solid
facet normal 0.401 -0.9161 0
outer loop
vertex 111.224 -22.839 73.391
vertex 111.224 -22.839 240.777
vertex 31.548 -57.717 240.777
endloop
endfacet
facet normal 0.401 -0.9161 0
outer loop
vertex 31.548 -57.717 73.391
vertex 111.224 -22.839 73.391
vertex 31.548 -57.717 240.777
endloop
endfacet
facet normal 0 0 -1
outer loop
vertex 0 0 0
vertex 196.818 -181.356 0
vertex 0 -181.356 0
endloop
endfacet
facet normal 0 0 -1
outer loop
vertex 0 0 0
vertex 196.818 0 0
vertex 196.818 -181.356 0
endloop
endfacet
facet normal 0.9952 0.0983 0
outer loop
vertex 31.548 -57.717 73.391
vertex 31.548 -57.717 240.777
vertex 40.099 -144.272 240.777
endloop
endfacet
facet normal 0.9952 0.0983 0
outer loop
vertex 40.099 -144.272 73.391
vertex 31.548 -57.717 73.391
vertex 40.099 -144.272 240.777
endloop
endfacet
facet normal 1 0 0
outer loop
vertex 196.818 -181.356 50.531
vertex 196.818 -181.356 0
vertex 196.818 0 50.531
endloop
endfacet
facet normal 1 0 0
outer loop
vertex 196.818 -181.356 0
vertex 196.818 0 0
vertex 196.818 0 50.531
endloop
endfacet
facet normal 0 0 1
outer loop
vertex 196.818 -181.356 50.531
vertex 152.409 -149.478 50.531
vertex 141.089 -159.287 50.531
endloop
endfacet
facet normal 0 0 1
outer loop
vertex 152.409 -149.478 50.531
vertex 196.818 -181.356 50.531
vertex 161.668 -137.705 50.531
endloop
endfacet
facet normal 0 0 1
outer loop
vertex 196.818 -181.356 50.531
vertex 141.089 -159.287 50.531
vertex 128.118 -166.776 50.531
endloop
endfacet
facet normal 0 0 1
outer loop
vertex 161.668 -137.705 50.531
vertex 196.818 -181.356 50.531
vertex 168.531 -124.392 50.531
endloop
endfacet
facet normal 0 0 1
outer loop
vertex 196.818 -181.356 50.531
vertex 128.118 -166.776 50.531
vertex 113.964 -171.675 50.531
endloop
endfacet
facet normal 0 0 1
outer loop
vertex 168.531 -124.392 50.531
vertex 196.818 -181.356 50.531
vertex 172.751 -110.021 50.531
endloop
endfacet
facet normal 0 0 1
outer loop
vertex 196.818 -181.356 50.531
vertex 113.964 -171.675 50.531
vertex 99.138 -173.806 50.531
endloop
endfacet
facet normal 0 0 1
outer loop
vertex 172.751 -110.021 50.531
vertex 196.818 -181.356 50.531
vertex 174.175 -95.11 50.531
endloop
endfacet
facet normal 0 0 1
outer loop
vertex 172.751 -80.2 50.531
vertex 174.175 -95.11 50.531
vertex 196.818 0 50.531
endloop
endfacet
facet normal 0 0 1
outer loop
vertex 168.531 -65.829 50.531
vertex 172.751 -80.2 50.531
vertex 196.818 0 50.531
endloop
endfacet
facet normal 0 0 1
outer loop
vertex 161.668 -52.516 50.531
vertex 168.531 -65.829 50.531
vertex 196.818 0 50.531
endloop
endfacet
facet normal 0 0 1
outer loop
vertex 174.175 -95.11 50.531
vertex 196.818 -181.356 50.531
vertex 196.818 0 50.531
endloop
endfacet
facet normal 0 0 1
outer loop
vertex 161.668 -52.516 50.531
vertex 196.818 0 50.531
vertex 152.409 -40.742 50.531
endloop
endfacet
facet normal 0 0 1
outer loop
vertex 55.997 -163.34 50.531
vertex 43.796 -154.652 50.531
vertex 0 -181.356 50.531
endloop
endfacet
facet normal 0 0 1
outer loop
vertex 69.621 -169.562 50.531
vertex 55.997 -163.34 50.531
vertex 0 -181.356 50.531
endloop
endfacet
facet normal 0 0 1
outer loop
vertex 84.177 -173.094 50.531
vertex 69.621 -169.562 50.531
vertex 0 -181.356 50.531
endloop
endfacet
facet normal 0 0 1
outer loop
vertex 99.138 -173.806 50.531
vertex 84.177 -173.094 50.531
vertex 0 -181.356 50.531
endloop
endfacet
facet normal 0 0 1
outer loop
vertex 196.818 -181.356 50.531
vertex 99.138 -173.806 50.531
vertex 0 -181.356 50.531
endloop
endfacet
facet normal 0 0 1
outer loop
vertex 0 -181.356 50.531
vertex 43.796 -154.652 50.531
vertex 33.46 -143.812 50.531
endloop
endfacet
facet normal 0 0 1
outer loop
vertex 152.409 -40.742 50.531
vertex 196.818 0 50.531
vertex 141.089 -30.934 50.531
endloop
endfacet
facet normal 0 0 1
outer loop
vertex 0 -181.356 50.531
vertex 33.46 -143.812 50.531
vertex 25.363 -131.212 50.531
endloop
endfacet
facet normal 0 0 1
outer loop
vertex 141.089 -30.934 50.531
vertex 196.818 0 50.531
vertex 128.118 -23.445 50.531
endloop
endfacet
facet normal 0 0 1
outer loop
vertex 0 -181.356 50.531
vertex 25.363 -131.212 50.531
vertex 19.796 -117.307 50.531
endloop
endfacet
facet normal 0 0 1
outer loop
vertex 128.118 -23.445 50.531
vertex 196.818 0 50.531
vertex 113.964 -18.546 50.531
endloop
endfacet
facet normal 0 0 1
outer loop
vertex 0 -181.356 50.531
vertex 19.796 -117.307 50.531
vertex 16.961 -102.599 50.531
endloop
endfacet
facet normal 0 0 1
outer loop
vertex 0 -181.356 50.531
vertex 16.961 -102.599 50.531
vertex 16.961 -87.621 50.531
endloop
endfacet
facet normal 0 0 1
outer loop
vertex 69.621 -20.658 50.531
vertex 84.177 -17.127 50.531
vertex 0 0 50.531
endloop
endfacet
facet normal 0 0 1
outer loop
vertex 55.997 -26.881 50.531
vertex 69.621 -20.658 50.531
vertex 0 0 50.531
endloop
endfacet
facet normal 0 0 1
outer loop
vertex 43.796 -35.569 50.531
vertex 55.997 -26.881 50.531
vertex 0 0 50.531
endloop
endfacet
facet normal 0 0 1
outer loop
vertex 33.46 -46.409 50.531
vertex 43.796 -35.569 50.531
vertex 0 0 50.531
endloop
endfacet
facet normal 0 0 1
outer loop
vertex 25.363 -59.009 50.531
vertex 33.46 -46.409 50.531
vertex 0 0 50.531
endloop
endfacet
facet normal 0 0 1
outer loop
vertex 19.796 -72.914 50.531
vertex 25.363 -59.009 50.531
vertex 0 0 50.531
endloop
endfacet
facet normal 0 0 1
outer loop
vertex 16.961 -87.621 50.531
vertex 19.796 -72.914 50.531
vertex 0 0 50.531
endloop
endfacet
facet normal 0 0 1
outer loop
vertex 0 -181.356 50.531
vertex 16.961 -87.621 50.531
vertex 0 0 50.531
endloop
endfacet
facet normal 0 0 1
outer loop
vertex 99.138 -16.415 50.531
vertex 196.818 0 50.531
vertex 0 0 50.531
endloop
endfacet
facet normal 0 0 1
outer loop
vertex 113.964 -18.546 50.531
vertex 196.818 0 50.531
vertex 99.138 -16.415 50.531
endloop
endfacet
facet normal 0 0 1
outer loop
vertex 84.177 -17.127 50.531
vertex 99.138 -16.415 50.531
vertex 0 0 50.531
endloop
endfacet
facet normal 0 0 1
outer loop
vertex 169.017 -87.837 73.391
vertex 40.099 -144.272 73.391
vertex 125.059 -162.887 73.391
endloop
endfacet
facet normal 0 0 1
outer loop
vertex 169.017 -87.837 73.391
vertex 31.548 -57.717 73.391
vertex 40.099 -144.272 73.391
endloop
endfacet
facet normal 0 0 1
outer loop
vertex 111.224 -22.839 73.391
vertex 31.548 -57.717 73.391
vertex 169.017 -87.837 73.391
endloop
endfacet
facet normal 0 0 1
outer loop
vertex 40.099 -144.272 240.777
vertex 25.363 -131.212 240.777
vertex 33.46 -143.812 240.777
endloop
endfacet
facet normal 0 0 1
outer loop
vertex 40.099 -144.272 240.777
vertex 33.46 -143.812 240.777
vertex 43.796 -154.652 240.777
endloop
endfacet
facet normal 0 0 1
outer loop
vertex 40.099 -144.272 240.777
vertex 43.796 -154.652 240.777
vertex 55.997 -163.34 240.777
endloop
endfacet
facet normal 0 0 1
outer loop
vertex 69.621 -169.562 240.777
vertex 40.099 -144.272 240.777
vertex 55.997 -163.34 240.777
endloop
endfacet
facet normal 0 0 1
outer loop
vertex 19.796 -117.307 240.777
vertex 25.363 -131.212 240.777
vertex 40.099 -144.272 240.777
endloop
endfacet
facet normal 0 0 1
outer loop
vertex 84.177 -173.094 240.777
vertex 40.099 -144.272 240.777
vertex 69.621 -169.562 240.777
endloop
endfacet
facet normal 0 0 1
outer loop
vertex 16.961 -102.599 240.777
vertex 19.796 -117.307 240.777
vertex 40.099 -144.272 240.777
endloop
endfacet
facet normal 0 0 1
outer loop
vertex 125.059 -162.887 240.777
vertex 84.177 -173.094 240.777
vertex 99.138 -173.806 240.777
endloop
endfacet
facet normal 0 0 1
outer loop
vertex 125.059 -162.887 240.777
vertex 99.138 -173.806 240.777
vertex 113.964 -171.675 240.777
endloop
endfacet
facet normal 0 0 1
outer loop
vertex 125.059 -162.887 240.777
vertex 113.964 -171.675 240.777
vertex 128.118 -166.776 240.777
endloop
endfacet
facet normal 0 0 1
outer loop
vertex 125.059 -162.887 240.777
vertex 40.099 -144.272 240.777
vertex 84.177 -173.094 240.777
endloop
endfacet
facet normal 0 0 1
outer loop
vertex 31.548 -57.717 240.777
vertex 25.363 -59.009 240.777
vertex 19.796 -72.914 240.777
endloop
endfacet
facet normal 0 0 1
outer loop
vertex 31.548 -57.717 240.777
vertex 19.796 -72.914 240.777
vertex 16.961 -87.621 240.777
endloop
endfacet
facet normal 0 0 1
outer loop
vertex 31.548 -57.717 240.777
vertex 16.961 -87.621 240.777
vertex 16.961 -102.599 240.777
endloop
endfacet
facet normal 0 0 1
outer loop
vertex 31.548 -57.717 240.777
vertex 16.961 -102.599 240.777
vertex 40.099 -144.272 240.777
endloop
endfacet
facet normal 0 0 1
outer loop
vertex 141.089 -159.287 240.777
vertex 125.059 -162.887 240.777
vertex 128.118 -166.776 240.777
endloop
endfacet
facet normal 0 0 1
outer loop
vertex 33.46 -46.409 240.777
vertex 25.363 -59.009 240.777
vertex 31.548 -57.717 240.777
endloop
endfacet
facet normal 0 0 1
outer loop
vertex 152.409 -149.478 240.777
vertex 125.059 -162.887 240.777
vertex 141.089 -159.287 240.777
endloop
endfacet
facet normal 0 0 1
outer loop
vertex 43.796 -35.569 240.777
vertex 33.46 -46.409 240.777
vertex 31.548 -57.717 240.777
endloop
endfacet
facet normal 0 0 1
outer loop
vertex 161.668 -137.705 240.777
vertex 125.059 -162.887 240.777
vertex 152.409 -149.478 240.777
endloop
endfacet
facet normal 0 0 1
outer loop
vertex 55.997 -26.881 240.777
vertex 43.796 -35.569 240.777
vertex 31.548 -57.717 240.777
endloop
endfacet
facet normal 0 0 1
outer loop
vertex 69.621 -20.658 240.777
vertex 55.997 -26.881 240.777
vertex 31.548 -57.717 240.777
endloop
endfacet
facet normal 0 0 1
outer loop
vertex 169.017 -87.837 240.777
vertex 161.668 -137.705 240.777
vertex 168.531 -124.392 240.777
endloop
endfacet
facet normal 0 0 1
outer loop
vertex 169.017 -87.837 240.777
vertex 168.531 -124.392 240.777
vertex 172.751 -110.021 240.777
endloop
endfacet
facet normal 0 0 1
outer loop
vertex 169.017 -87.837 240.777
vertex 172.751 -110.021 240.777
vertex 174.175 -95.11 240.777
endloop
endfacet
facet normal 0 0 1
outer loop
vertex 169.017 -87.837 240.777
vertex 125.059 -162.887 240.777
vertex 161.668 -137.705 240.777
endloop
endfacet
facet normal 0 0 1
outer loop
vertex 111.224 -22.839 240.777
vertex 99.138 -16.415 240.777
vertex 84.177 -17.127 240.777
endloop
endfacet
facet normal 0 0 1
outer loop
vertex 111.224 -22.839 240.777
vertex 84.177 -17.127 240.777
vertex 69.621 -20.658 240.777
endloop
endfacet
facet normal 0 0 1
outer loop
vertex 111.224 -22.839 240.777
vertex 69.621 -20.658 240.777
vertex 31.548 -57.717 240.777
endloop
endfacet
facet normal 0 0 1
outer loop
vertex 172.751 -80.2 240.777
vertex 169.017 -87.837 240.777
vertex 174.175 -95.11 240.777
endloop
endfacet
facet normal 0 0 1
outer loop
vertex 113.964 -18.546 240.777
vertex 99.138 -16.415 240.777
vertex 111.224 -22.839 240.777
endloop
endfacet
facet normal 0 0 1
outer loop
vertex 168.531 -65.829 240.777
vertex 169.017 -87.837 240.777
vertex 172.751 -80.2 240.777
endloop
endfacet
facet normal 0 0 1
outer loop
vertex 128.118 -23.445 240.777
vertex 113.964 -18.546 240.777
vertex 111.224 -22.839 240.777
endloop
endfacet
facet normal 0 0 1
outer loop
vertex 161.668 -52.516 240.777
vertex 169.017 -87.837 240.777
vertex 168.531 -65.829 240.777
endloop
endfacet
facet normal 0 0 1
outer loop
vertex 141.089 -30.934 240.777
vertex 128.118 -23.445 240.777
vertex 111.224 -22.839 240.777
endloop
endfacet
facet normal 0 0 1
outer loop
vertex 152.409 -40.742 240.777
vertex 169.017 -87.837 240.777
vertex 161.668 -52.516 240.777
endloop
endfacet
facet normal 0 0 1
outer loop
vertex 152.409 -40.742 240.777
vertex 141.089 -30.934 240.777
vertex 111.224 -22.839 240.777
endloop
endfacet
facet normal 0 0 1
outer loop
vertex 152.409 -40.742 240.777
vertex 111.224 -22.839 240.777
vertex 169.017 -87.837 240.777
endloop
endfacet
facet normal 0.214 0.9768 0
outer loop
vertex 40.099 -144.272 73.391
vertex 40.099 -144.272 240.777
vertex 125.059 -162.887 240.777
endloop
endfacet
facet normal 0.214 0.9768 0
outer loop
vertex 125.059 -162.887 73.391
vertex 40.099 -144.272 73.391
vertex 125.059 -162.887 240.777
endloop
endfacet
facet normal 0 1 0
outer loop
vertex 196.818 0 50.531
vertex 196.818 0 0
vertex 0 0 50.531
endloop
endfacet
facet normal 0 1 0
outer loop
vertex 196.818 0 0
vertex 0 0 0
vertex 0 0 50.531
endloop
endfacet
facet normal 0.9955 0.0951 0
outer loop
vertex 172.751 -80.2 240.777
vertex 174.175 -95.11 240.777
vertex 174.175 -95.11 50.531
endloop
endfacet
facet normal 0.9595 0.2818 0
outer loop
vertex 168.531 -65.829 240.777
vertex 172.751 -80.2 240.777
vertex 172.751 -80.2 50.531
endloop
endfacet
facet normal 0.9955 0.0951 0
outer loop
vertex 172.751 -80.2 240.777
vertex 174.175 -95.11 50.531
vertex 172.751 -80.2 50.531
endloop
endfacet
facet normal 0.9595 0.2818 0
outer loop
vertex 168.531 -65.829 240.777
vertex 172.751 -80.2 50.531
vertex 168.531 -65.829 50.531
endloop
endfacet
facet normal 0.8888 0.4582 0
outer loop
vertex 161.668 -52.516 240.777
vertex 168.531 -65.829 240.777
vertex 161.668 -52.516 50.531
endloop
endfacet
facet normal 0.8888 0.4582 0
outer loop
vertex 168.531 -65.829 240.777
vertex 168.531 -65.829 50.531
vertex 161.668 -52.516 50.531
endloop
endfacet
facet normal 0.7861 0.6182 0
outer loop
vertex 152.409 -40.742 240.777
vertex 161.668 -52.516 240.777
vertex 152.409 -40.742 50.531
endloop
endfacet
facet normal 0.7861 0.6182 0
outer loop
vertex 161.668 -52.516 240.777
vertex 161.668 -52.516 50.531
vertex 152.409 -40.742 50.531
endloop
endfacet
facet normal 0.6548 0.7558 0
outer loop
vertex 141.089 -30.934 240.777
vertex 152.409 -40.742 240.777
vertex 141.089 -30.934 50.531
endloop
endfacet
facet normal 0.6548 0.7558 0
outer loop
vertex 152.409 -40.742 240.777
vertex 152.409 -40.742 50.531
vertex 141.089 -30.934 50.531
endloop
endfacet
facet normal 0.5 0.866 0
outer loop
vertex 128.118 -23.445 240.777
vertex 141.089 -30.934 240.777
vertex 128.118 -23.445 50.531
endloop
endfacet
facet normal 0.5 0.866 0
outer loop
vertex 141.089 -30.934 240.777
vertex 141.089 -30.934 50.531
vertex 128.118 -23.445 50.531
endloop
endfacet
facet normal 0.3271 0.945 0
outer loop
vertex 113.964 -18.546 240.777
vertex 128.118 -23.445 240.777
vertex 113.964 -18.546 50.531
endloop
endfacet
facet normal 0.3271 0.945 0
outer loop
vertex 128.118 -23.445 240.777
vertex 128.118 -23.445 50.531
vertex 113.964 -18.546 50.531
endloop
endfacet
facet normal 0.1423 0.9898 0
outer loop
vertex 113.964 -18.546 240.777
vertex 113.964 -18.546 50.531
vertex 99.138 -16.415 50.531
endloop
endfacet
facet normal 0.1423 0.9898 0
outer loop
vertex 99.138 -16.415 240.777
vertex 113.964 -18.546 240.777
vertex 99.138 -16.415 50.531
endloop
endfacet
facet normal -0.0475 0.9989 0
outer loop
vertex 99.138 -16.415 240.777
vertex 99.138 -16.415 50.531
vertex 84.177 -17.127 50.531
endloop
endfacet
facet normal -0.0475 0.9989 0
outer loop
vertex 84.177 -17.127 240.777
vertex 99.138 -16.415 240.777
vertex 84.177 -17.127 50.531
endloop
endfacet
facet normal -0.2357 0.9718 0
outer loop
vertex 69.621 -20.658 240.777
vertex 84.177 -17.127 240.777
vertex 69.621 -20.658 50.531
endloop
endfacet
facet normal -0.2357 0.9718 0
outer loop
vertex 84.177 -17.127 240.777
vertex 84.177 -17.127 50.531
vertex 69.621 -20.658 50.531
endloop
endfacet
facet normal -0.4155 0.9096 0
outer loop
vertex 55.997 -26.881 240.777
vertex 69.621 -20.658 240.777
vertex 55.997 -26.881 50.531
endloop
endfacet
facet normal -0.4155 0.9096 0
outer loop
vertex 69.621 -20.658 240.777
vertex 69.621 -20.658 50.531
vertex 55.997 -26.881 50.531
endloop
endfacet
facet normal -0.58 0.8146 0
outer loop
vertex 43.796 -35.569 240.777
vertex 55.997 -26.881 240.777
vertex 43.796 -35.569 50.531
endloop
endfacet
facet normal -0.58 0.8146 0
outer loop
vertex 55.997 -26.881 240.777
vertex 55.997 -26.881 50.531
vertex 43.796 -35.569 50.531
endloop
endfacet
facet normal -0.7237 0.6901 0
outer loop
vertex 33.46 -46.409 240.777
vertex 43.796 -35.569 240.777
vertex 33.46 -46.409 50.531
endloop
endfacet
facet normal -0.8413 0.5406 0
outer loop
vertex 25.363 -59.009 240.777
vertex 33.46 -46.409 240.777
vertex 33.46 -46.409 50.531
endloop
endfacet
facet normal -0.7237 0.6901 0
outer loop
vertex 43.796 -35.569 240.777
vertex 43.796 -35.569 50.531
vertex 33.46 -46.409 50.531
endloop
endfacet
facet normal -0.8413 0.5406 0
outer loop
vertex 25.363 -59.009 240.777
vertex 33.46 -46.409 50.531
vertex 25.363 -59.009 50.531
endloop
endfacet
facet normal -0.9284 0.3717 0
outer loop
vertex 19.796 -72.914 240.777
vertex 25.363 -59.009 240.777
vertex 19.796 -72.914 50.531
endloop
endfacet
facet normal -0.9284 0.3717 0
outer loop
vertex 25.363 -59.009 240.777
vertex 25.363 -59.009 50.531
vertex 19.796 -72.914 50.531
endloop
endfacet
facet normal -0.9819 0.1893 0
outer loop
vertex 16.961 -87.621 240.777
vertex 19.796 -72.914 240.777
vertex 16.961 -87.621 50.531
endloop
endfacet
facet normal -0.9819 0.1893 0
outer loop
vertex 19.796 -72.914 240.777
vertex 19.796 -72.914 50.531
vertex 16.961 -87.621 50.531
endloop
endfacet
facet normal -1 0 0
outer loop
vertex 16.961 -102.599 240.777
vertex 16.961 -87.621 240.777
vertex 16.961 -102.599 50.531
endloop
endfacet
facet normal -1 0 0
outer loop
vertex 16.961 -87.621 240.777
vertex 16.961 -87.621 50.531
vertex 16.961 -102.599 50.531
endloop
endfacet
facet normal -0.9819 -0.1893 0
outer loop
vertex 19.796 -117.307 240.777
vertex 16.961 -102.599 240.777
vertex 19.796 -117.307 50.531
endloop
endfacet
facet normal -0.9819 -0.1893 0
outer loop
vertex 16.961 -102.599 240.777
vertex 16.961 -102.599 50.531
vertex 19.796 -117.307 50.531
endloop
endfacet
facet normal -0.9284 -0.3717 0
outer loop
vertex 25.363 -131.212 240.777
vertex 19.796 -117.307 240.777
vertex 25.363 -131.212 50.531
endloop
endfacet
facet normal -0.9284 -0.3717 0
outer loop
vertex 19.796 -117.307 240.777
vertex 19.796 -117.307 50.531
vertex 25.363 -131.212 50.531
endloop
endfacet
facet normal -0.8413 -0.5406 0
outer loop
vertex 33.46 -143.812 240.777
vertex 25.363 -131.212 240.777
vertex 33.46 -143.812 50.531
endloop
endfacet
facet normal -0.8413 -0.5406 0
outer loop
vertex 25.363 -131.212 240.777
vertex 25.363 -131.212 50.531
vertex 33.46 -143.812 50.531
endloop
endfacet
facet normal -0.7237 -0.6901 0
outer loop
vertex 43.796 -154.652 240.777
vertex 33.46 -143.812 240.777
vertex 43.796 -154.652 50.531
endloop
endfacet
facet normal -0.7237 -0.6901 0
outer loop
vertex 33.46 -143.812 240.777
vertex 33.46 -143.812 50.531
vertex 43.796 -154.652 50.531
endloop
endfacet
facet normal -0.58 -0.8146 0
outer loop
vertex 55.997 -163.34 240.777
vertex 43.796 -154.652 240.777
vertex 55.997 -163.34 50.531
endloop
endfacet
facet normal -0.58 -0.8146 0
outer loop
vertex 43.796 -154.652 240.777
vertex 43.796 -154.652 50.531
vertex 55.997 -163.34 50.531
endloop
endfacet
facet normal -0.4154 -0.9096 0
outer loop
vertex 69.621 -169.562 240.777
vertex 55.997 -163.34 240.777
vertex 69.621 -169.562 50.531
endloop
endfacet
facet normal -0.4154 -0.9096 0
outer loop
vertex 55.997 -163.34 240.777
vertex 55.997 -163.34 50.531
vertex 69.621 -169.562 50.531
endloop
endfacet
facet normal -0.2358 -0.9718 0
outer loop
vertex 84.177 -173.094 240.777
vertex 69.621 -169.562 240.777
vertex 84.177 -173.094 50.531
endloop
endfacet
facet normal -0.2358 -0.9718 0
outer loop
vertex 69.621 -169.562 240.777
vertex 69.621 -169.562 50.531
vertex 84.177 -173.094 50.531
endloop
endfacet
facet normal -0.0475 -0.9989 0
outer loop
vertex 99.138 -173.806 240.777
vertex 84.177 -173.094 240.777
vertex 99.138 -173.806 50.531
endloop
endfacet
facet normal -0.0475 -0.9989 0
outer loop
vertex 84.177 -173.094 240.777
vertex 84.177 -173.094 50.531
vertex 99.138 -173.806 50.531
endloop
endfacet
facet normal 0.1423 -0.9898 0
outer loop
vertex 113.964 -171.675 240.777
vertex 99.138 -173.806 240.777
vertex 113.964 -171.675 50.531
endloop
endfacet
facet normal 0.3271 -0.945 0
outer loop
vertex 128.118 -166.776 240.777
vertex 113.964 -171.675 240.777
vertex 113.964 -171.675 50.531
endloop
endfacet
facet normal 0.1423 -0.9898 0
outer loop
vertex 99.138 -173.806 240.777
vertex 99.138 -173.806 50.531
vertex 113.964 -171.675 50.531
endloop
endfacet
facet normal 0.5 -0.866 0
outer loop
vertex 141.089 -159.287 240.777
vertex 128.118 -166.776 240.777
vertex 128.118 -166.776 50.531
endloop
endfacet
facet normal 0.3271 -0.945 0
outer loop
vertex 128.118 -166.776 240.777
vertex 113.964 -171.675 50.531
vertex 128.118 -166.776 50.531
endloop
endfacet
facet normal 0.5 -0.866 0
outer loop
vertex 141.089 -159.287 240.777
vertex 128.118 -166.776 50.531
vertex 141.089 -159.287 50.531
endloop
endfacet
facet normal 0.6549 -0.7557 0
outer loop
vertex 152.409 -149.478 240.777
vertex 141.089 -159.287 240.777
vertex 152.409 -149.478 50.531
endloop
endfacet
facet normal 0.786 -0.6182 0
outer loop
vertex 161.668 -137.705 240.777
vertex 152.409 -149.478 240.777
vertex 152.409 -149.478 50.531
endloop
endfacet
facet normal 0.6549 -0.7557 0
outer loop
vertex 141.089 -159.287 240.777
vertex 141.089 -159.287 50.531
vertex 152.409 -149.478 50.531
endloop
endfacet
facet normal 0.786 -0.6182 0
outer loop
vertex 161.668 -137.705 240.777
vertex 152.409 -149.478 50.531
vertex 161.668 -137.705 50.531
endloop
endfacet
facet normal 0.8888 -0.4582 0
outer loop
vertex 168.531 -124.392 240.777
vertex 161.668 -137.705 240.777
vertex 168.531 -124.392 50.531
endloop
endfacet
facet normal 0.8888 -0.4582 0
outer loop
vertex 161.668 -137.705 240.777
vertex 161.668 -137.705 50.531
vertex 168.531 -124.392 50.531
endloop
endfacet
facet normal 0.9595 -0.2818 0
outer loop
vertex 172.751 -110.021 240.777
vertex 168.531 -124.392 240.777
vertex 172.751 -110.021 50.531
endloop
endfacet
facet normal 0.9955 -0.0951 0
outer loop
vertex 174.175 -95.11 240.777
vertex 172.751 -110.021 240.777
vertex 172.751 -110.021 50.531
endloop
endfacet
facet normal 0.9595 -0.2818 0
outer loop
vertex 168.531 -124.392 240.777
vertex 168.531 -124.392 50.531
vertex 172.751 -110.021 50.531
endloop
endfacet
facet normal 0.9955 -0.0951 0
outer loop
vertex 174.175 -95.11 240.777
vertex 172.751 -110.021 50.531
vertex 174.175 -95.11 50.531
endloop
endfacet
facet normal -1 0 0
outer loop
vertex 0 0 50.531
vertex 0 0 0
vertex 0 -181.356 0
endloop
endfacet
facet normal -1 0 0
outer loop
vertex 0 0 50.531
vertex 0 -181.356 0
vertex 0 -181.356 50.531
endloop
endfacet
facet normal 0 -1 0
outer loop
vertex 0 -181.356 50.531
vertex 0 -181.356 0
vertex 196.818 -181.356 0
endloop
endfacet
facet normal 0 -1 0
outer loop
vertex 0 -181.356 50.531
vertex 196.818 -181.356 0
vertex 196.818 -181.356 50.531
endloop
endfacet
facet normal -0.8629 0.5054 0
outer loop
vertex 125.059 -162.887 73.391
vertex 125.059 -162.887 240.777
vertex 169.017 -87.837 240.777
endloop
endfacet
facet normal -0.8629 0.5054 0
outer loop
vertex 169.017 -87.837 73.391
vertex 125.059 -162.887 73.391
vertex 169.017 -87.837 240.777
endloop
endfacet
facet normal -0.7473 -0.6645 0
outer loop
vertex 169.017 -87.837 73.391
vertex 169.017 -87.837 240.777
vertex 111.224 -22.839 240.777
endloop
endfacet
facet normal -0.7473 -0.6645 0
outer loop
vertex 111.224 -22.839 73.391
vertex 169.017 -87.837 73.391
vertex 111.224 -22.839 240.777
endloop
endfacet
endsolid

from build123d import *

# Parameters (mm, degrees)
F0_W      = 56.1024434865
F0_H      = 50.5313724279
F1_DEPTH  = 75.692
F2_DEPTH  = 140.716
F3_DEPTH  = 105.664
F4_R      = 78.7850873133
F5_DEPTH  = 190.246
F6_R      = 25.2857639188
F7_DEPTH  = 125.476
F8_R      = 34.6183044946
F9_DEPTH  = 83.566
F11_DEPTH = 167.386


with BuildPart() as f1:
    # F0 (on Front) → F1 (new body)
    with BuildSketch(Plane.XZ):
        with Locations((28.0512217432, 25.265686214)):
            Rectangle(F0_W, F0_H)
    extrude(amount=F1_DEPTH)

    # F2 (add): a face of the model
    f2_faces = [f1.faces().sort_by_distance(p)[0] for p in [
        (56.1024434865, -37.846, 25.265686214),
    ]]
    extrude(f2_faces, amount=F2_DEPTH)

    # F3 (add): a face of the model
    f3_faces = [f1.faces().sort_by_distance(p)[0] for p in [
        (98.4092217432, -75.692, 25.265686214),
    ]]
    extrude(f3_faces, amount=F3_DEPTH)

    # F4 (on face) → F5 (join)
    with BuildSketch(Plane.XY.offset(50.5313724279)):
        with Locations((95.3895151615, -95.1104015112)):
            Circle(F4_R)
    extrude(amount=F5_DEPTH)

    # F6 (on face) → F7 (cut)
    with BuildSketch(Plane.XY.offset(240.7773724279)):
        with Locations((95.3895151615, -95.1104015112)):
            Circle(F6_R)
    extrude(amount=F7_DEPTH, mode=Mode.SUBTRACT)

    # F8 (on face) → F9 (cut)
    with BuildSketch(Plane.XY.offset(240.7773724279)):
        with Locations((95.3895151615, -95.1104015112)):
            Circle(F8_R)
    extrude(amount=-F9_DEPTH, mode=Mode.SUBTRACT)

    # F10 (on face) → F11 (cut)
    with BuildSketch(Plane.XY.offset(240.7773724279)):
        Polygon((40.0986362787, -144.27217879), (125.0593225865, -162.8869768172), (169.0173434726, -87.8368514126), (111.2242081507, -22.8385250253), (31.5480653191, -57.7174755108), align=None)
    extrude(amount=-F11_DEPTH, mode=Mode.SUBTRACT)


solid = f1.part
